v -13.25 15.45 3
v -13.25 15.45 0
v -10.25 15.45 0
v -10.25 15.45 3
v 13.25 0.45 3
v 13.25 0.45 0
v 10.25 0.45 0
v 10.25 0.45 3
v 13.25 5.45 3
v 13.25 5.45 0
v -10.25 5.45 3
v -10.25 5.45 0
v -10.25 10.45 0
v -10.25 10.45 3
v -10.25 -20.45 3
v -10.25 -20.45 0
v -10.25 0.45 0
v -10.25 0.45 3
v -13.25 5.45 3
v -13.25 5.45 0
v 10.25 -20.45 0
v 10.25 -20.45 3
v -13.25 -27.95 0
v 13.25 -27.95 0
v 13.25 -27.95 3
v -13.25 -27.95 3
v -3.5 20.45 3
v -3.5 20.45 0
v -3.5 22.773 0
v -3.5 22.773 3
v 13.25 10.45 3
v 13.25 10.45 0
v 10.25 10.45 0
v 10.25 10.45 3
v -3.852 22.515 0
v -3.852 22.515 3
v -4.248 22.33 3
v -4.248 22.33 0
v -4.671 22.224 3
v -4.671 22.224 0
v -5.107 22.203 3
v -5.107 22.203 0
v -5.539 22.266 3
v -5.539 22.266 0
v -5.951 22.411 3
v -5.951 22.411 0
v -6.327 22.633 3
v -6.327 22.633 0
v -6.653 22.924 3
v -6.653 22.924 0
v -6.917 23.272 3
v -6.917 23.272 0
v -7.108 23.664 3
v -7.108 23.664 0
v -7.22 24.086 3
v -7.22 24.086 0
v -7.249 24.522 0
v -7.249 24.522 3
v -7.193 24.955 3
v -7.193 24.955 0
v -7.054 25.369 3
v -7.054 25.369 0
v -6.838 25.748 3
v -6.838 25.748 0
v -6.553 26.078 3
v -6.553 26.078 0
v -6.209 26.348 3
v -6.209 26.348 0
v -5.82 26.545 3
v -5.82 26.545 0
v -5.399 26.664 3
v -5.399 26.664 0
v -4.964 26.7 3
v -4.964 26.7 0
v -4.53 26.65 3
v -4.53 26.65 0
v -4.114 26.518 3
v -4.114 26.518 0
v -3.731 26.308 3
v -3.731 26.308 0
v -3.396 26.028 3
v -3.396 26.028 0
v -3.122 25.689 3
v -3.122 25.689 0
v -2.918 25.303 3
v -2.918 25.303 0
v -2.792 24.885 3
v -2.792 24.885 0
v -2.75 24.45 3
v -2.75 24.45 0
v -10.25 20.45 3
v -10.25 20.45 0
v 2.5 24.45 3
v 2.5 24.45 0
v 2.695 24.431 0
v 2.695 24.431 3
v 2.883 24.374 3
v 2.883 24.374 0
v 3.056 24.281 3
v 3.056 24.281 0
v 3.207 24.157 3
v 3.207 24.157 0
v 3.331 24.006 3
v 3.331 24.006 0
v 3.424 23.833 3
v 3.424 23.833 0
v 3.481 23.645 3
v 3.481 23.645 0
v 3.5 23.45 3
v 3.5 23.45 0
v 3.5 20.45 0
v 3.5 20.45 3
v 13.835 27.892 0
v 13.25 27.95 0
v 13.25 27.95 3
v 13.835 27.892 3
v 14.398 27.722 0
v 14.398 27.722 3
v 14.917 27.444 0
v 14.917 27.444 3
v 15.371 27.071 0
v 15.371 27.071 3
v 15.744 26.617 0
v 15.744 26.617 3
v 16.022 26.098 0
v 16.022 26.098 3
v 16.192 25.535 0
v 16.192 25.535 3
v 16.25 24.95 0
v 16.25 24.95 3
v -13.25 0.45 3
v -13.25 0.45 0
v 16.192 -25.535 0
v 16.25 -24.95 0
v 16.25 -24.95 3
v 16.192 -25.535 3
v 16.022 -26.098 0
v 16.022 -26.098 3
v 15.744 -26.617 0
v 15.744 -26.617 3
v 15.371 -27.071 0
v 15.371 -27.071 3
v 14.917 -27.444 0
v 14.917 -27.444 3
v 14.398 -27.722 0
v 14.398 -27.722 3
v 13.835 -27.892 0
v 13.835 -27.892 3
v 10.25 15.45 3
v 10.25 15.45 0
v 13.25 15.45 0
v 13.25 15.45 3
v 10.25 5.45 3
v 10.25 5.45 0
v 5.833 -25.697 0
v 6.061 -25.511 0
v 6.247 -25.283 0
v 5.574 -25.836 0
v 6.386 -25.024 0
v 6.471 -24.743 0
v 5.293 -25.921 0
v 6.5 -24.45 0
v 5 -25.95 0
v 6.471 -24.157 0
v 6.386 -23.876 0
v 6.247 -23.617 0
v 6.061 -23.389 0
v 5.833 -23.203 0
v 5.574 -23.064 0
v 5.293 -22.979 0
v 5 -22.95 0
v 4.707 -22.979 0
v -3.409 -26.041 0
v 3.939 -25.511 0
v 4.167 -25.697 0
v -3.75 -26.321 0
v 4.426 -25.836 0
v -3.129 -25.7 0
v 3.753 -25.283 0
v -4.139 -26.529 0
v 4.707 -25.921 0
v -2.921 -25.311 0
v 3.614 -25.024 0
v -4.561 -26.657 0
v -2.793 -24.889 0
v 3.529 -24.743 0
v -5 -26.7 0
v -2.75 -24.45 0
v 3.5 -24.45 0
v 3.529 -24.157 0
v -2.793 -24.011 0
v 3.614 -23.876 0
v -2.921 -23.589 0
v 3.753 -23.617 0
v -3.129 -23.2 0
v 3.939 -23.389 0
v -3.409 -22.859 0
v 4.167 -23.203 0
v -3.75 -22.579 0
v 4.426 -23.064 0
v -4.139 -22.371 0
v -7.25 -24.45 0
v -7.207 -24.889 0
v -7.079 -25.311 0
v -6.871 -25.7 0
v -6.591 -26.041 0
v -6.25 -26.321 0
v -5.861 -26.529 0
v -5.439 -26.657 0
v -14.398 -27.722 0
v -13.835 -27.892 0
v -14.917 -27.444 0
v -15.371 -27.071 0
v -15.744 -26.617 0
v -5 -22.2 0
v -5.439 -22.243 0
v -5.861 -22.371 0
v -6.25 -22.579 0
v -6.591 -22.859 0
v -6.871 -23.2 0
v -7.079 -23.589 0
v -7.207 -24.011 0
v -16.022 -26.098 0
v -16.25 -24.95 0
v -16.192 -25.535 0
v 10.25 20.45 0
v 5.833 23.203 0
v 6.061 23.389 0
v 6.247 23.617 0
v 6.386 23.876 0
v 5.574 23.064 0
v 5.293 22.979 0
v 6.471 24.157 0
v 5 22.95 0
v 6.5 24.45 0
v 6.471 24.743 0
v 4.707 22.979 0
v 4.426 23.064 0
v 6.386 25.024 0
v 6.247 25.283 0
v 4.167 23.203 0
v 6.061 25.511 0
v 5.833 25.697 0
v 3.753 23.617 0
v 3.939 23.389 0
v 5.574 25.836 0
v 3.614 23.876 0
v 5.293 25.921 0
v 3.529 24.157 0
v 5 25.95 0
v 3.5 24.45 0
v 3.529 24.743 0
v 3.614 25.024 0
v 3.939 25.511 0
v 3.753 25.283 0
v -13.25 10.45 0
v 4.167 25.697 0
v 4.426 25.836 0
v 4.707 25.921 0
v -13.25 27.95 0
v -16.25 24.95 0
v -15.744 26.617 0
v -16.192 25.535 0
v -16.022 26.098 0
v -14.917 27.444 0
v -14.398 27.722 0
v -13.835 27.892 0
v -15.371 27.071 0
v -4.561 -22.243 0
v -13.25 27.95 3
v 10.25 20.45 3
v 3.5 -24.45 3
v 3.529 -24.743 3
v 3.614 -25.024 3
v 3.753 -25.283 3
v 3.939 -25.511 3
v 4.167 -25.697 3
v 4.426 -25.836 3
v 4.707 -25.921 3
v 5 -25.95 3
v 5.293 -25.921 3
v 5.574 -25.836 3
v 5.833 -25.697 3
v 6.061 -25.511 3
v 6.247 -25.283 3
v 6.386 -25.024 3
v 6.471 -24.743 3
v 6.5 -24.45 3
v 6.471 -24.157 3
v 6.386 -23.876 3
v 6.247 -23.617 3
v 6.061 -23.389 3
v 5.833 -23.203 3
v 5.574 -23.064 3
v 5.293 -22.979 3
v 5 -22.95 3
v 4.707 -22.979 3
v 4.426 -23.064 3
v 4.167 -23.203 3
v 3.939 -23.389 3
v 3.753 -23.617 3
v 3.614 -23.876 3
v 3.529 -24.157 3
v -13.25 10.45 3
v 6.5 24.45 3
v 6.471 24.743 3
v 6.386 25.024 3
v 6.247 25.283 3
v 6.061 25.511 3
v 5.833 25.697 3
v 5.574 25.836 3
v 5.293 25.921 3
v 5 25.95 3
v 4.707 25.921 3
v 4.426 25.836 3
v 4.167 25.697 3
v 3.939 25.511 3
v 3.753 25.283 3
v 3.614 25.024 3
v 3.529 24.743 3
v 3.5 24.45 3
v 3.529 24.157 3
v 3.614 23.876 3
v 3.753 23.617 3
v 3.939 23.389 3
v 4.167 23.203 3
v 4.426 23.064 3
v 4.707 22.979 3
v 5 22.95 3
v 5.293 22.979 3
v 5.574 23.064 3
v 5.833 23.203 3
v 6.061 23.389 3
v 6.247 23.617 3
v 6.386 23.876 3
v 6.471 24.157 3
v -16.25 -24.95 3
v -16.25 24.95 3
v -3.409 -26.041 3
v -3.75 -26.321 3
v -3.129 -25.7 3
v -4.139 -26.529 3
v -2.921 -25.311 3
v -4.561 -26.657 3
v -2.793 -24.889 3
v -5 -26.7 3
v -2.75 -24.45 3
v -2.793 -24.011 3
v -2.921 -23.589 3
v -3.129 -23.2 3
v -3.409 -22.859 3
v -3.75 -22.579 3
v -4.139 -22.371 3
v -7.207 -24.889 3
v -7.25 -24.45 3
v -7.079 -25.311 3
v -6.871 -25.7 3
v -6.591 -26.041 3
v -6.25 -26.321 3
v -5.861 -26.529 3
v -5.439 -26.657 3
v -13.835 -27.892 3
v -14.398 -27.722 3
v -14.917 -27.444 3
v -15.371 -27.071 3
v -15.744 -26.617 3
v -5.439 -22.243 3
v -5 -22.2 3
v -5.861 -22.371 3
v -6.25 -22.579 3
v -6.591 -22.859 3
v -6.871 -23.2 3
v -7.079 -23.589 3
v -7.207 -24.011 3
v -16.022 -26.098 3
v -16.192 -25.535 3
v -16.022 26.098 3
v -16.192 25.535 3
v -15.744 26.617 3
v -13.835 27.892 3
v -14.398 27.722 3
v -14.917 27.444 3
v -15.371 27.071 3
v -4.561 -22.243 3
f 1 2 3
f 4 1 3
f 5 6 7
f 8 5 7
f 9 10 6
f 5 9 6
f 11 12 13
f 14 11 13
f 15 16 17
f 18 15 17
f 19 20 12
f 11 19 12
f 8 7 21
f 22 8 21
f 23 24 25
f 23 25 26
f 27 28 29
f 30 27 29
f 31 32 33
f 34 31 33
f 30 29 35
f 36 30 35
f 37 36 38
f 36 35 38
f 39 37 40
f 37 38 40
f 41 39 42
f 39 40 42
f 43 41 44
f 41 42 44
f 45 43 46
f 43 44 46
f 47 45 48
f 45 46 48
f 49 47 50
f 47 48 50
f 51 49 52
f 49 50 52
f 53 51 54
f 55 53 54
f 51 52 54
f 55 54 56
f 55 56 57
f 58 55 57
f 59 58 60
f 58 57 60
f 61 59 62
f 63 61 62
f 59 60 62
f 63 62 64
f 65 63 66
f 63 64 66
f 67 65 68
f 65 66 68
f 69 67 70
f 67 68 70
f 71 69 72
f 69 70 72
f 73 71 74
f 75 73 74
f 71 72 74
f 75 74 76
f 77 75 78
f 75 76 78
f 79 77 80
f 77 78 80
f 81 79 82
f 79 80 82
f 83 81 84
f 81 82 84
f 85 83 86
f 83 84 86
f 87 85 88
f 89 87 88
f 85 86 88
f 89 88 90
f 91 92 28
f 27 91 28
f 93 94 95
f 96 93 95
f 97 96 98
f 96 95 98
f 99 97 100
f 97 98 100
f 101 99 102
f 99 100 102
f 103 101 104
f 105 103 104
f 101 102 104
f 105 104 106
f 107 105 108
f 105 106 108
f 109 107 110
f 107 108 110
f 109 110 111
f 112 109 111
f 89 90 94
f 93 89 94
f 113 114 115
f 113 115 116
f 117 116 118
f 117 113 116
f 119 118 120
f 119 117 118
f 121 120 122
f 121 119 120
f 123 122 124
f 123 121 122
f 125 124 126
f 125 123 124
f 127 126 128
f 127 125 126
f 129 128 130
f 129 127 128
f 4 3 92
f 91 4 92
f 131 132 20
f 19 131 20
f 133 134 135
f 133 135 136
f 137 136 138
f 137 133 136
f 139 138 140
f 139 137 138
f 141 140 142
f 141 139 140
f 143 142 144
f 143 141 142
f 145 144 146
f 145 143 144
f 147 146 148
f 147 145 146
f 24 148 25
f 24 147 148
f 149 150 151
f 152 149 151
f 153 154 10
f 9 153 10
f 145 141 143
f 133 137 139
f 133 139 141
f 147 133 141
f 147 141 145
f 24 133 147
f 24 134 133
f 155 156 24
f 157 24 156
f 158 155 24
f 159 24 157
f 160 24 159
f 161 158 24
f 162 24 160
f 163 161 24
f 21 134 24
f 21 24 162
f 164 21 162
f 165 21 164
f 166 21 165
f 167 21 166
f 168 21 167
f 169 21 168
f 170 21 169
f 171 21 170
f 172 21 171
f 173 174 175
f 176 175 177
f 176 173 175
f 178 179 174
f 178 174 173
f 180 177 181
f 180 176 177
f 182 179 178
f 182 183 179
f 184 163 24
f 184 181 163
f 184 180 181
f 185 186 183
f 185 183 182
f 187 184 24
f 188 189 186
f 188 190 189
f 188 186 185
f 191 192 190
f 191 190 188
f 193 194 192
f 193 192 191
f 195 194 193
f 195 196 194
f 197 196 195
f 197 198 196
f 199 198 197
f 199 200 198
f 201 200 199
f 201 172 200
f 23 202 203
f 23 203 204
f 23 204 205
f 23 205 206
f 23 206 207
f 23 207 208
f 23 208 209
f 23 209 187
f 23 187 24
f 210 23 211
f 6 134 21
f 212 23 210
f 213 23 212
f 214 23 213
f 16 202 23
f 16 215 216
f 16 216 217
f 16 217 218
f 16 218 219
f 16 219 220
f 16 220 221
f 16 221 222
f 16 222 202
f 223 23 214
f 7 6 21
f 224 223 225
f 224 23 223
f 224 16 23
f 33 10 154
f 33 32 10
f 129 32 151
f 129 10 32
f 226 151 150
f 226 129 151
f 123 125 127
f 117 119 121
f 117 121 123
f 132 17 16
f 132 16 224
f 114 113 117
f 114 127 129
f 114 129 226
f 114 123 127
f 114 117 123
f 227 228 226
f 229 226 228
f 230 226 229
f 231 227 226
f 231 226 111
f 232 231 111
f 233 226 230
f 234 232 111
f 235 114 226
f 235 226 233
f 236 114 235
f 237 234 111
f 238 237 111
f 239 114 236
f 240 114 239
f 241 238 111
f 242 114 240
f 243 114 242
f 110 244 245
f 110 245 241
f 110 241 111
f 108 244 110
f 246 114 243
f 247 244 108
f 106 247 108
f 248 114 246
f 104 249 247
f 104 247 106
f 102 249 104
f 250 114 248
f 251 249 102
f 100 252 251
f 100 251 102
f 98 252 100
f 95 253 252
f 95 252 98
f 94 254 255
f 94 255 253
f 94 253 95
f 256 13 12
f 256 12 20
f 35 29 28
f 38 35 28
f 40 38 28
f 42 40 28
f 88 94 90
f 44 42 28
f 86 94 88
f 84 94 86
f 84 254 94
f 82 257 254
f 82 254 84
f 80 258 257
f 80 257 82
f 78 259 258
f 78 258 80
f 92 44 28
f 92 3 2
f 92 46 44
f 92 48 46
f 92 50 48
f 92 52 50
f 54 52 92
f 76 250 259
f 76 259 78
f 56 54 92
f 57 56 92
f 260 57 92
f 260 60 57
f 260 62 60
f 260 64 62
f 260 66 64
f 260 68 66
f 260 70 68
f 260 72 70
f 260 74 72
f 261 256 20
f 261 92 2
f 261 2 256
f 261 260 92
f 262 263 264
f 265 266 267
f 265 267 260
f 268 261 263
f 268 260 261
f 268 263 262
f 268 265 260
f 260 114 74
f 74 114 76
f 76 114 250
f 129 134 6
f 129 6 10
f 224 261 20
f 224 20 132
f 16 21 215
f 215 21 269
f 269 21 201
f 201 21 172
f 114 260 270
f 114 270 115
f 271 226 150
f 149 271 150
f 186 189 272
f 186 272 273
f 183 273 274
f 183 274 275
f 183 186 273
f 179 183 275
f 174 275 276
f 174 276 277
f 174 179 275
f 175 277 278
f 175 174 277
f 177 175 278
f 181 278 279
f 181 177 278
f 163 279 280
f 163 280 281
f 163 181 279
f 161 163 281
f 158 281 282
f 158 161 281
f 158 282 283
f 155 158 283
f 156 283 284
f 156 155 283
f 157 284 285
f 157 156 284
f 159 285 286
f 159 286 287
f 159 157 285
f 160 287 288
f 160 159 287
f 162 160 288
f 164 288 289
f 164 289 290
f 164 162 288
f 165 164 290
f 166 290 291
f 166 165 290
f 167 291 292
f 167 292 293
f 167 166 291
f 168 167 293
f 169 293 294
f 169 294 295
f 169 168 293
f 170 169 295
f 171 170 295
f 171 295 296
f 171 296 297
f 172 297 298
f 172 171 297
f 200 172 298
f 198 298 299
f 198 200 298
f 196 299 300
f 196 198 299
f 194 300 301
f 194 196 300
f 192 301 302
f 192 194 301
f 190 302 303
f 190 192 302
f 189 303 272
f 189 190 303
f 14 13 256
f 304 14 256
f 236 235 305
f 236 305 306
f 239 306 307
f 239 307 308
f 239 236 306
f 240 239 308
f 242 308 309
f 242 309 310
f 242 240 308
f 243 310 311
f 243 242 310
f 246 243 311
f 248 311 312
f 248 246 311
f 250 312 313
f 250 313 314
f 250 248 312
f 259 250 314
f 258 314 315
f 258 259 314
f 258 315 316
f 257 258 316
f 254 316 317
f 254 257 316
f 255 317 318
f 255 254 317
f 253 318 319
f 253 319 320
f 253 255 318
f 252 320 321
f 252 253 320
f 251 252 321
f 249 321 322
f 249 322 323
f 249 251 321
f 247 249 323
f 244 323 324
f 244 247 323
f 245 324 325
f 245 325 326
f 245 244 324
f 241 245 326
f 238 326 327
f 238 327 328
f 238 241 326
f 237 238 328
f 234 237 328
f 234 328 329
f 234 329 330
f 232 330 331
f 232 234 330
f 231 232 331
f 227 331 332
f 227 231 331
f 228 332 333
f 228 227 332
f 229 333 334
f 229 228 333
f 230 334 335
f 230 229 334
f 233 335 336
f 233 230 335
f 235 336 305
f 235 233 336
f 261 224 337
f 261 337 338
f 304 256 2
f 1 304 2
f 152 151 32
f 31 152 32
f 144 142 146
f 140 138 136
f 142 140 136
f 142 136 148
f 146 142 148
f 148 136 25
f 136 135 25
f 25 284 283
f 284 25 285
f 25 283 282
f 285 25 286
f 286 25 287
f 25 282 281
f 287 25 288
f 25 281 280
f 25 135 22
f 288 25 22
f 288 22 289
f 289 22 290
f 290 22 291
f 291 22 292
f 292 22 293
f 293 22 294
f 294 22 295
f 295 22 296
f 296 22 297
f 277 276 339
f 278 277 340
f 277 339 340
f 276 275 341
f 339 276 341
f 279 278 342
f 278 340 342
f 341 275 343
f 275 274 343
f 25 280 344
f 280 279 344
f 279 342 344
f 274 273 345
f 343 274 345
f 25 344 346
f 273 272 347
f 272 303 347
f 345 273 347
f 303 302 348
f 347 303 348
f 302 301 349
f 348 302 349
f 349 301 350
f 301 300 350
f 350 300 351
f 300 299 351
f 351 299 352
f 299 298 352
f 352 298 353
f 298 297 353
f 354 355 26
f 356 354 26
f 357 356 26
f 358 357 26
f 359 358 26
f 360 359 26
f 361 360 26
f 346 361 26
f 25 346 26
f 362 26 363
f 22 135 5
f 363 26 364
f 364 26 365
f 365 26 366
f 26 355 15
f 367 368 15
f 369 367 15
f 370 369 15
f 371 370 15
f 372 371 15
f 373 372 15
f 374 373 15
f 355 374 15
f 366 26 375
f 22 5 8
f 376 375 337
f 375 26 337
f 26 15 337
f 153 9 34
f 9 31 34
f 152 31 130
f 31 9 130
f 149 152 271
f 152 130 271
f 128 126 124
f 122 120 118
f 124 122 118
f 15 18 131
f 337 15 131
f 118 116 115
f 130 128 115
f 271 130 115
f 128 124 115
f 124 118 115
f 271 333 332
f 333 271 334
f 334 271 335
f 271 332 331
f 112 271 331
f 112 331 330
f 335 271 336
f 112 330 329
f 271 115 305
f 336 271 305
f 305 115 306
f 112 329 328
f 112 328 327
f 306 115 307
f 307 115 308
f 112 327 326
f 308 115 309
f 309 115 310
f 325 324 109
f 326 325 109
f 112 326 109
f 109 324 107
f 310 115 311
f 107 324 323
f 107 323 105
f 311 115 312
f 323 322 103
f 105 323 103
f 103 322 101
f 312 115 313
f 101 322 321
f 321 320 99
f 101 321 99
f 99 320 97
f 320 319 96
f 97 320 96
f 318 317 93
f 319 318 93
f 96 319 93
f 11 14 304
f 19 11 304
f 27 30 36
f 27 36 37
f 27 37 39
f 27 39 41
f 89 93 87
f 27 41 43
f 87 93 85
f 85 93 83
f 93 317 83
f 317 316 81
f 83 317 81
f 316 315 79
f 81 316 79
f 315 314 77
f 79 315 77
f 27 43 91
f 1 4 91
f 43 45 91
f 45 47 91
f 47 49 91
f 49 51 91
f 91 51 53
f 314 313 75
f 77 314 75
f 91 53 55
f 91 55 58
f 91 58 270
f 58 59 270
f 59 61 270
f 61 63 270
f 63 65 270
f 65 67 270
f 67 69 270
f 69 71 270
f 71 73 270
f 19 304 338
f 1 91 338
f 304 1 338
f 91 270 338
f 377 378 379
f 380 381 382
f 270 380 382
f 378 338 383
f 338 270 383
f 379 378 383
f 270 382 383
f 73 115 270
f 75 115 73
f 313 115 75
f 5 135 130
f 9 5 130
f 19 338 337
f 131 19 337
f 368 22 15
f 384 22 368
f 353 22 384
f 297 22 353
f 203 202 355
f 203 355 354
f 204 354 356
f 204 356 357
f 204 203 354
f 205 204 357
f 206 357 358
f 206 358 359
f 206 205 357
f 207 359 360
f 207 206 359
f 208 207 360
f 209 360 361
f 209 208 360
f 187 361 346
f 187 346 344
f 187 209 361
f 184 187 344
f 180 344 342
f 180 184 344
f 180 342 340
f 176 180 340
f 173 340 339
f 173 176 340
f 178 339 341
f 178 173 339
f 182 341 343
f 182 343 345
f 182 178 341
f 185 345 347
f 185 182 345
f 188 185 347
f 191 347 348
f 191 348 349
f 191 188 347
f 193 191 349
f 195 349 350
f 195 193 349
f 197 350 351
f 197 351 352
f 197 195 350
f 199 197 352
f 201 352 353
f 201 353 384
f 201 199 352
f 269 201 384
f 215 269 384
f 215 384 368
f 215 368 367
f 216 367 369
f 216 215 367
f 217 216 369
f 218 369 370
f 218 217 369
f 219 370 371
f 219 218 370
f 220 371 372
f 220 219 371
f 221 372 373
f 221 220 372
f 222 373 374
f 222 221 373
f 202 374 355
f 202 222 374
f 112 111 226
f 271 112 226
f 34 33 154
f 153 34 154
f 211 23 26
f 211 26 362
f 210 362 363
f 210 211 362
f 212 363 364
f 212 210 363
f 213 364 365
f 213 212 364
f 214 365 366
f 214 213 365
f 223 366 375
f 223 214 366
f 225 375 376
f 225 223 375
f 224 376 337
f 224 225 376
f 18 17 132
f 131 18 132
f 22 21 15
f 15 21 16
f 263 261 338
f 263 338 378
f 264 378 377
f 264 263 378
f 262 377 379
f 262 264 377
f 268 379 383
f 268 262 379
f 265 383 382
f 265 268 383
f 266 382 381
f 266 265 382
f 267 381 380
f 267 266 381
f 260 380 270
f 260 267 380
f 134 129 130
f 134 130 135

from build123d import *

# Parameters (mm, degrees)
SKETCH1_R           = 1.5
SKETCH1_R_2         = 2.25
BOSS_EXTRUDE1_DEPTH = 3


with BuildPart() as part:
    # Sketch1 → Boss-Extrude1 (new body)
    with BuildSketch(Plane.XY):
        with BuildLine():
            Line((-13.25, 27.95), (13.25, 27.95))
            ThreePointArc((13.25, 27.95), (15.371320344, 27.071320344), (16.25, 24.95))
            Line((16.25, 24.95), (16.25, -24.95))
            ThreePointArc((16.25, -24.95), (15.371320344, -27.071320344), (13.25, -27.95))
            Line((13.25, -27.95), (-13.25, -27.95))
            ThreePointArc((-13.25, -27.95), (-15.371320344, -27.071320344), (-16.25, -24.95))
            Line((-16.25, -24.95), (-16.25, 24.95))
            ThreePointArc((-16.25, 24.95), (-15.371320344, 27.071320344), (-13.25, 27.95))
        make_face()
        with Locations((5, 24.45)):
            Circle(SKETCH1_R, mode=Mode.SUBTRACT)
        with Locations(Location((5, -24.45, 0), (0, 0, 180))):
            Circle(SKETCH1_R, mode=Mode.SUBTRACT)
        with Locations(Location((-5, -24.45, 0), (0, 0, 180))):
            Circle(SKETCH1_R_2, mode=Mode.SUBTRACT)
        with BuildLine():
            Line((-10.25, 20.45), (-3.5, 20.45))
            Line((-3.5, 20.45), (-3.5, 22.772949017))
            ThreePointArc((-3.5, 22.772949017), (-7.053959591, 25.368558654), (-2.75, 24.45))
            Line((-2.75, 24.45), (2.5, 24.45))
            ThreePointArc((2.5, 24.45), (3.207106781, 24.157106781), (3.5, 23.45))
            Line((3.5, 23.45), (3.5, 20.45))
            Line((3.5, 20.45), (10.25, 20.45))
            Line((10.25, 20.45), (10.25, 15.45))
            Line((10.25, 15.45), (13.25, 15.45))
            Line((13.25, 15.45), (13.25, 10.45))
            Line((13.25, 10.45), (10.25, 10.45))
            Line((10.25, 10.45), (10.25, 5.45))
            Line((10.25, 5.45), (13.25, 5.45))
            Line((13.25, 5.45), (13.25, 0.45))
            Line((13.25, 0.45), (10.25, 0.45))
            Line((10.25, 0.45), (10.25, -20.45))
            Line((10.25, -20.45), (-10.25, -20.45))
            Line((-10.25, -20.45), (-10.25, 0.45))
            Line((-10.25, 0.45), (-13.25, 0.45))
            Line((-13.25, 0.45), (-13.25, 5.45))
            Line((-13.25, 5.45), (-10.25, 5.45))
            Line((-10.25, 5.45), (-10.25, 10.45))
            Line((-10.25, 10.45), (-13.25, 10.45))
            Line((-13.25, 10.45), (-13.25, 15.45))
            Line((-13.25, 15.45), (-10.25, 15.45))
            Line((-10.25, 15.45), (-10.25, 20.45))
        make_face(mode=Mode.SUBTRACT)
    extrude(amount=BOSS_EXTRUDE1_DEPTH)


solid = part.part
